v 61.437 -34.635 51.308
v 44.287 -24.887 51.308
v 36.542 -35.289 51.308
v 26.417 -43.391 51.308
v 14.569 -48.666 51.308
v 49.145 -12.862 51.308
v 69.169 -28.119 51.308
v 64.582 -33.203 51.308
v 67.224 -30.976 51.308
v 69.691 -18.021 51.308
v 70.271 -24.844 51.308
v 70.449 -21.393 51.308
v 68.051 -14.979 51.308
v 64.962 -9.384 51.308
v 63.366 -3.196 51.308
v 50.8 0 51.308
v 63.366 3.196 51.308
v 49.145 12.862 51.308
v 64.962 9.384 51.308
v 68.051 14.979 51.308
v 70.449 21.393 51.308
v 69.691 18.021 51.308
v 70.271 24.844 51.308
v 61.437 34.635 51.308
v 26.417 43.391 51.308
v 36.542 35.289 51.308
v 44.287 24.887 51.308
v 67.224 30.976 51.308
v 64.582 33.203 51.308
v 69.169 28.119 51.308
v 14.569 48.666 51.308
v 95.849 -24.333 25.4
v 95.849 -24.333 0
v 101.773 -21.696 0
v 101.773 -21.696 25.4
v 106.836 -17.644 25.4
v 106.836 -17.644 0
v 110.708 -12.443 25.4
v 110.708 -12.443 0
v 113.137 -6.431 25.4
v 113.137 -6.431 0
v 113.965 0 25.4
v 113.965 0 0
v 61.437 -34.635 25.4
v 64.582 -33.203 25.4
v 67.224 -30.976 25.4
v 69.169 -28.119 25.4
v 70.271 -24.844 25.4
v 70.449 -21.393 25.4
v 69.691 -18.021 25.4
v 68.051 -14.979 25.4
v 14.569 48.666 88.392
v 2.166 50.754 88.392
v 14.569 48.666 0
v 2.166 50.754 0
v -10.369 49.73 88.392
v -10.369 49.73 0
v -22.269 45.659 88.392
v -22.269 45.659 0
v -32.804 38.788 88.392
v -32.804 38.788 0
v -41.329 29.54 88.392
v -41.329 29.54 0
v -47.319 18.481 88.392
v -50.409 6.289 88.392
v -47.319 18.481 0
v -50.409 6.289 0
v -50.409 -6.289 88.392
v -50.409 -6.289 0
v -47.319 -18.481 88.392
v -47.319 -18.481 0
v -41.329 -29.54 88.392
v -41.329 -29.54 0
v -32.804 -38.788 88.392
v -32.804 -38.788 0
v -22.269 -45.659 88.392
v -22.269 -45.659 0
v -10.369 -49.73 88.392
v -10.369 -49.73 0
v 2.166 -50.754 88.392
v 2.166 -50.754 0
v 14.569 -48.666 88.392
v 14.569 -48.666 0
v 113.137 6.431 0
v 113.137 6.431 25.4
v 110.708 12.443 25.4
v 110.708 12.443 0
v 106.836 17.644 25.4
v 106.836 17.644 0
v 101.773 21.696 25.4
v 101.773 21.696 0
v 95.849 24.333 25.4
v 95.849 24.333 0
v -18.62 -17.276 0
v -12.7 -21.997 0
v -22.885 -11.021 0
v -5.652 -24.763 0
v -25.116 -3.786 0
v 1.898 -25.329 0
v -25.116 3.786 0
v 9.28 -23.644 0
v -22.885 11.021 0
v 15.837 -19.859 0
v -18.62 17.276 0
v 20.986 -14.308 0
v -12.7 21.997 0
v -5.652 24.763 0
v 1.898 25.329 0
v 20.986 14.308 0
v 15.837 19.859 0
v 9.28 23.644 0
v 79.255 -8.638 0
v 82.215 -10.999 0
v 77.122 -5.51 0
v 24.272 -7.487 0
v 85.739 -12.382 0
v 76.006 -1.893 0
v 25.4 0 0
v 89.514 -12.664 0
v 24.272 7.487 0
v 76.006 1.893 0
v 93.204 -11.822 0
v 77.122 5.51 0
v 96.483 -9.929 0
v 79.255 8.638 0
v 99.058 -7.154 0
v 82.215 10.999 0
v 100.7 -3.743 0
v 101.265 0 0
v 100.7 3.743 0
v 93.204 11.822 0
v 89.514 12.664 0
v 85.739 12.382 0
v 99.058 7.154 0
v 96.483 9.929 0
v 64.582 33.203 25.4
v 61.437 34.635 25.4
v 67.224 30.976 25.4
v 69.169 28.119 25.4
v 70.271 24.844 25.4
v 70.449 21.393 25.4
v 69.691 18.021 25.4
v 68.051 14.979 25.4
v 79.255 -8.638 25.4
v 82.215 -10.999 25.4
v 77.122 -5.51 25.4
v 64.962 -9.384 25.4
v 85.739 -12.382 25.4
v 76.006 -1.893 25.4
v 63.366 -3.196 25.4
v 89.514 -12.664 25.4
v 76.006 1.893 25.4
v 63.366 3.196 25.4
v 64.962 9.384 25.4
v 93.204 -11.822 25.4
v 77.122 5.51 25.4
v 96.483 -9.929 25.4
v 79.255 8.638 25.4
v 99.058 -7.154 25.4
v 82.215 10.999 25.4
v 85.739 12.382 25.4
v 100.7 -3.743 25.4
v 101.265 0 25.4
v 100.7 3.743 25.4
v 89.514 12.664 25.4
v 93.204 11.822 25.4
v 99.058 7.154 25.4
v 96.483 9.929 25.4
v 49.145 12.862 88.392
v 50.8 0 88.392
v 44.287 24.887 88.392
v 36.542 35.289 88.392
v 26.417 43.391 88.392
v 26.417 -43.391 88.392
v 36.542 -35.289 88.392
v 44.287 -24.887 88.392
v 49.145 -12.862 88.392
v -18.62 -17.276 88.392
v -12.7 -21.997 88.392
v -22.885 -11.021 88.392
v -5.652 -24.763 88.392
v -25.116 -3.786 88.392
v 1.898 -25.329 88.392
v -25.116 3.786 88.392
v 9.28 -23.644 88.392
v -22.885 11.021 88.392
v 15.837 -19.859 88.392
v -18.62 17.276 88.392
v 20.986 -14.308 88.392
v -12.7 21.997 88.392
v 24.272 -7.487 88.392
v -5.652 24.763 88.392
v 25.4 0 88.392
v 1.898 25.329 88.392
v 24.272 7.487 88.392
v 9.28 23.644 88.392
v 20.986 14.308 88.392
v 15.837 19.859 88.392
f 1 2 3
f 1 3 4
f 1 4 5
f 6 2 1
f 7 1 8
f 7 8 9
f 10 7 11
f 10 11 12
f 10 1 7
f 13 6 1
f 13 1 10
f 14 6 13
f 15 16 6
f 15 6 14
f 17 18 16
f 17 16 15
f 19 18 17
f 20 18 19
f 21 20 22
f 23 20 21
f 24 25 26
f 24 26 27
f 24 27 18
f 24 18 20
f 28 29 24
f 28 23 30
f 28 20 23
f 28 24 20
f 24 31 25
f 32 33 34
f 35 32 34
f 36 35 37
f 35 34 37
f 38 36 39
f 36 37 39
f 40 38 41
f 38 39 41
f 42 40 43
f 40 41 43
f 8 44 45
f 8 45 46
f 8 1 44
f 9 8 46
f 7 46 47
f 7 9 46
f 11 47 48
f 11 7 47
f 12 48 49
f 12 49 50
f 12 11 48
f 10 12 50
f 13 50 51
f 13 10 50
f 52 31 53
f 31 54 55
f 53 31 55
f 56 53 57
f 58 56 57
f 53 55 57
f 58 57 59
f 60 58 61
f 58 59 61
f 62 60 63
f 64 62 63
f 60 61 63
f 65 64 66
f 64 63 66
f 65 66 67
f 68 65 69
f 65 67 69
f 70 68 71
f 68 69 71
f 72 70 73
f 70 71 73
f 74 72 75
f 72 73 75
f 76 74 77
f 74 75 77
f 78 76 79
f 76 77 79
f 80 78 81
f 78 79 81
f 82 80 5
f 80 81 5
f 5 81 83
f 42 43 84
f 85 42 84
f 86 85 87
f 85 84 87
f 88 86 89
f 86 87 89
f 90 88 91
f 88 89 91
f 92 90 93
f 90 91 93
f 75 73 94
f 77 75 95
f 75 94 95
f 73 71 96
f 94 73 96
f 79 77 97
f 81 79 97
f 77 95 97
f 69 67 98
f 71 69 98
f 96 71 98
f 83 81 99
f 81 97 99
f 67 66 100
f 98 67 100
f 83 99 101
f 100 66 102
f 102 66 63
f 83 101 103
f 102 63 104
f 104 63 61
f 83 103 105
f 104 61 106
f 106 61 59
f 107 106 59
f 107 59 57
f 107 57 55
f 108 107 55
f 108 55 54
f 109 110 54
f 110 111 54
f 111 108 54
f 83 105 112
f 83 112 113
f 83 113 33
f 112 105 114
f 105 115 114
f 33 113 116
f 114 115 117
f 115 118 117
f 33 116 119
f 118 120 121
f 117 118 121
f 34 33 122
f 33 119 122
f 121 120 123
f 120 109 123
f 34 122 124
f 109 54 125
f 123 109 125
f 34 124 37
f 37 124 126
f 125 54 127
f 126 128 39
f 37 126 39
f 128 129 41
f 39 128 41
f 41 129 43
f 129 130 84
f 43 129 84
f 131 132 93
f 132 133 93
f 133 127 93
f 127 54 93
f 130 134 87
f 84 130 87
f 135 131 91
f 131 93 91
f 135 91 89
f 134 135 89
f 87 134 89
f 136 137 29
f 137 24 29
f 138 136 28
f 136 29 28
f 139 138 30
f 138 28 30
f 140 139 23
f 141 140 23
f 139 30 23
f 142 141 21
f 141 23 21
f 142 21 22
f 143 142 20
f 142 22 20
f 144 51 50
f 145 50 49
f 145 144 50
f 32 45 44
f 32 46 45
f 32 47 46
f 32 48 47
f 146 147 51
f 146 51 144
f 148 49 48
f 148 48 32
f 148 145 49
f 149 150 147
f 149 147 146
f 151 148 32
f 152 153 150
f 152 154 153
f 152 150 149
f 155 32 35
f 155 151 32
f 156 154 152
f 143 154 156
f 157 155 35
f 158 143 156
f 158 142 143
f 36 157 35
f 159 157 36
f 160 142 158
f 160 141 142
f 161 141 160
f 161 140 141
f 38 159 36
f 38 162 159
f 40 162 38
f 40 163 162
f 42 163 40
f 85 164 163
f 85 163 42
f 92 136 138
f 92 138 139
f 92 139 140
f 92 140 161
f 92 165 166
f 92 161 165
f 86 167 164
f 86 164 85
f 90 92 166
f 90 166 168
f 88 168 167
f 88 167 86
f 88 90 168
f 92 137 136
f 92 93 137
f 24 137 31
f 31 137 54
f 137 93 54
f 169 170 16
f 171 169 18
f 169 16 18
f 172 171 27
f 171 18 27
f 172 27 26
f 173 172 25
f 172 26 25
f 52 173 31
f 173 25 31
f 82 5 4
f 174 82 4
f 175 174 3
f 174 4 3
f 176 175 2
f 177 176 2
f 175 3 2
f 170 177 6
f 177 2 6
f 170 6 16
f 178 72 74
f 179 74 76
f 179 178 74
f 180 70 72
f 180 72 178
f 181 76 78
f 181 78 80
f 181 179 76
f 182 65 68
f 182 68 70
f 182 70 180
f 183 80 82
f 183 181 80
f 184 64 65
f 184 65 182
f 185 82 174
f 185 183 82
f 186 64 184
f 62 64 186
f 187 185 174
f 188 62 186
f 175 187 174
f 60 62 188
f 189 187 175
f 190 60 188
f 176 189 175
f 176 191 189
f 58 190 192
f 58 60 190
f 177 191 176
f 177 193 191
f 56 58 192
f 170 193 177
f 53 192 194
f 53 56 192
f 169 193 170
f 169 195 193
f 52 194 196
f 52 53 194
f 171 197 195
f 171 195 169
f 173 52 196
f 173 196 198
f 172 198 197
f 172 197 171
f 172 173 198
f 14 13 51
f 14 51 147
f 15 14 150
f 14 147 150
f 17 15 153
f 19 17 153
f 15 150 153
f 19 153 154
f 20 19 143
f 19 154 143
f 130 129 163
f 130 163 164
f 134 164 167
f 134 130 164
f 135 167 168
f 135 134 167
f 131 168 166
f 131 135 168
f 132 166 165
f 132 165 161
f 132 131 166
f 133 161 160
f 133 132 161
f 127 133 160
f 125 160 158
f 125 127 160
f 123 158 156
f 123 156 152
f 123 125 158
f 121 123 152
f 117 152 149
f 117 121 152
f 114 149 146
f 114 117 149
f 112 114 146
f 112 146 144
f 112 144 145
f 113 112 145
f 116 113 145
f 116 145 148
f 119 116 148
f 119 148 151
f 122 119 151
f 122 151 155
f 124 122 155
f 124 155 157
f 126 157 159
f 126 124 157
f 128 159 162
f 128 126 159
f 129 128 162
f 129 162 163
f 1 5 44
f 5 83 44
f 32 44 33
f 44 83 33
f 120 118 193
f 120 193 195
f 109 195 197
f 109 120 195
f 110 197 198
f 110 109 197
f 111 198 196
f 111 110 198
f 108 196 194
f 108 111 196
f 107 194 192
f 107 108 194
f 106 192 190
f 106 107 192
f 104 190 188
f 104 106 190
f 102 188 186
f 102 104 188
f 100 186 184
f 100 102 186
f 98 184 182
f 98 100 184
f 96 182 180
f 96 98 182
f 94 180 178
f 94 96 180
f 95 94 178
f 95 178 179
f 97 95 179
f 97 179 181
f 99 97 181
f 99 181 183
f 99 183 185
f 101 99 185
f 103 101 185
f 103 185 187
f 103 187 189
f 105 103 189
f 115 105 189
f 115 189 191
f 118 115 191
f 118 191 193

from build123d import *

# Parameters (mm, degrees)
F0_R     = 25.4
F0_R_2   = 12.7
F1_DEPTH = 25.4
F2_DEPTH = 88.392
F3_DEPTH = 51.308
F4_R     = 12.7


with BuildPart() as f1:
    # F0 (on Top) → F1 (new body)
    with BuildSketch(Plane.XY):
        with BuildLine():
            ThreePointArc((14.569248, -48.665974), (40.747747, -30.335805), (50.8, 0))
            ThreePointArc((50.8, 0), (40.747747, 30.335805), (14.569248, 48.665974))
            ThreePointArc((14.569248, 48.665974), (-50.8, 0), (14.569248, -48.665974))
        make_face()
        Circle(F0_R, mode=Mode.SUBTRACT)
        with BuildLine():
            ThreePointArc((14.569248, 48.665974), (40.747747, 30.335805), (50.8, 0))
            ThreePointArc((50.8, 0), (40.747747, -30.335805), (14.569248, -48.665974))
            Line((14.569248, -48.665974), (95.849248, -24.332987))
            ThreePointArc((95.849248, -24.332987), (63.164624, 0), (95.849248, 24.332987))
            Line((95.849248, 24.332987), (14.569248, 48.665974))
        make_face()
        with BuildLine():
            ThreePointArc((113.964624, 0), (108.938498, 15.167903), (95.849248, 24.332987))
            ThreePointArc((95.849248, 24.332987), (63.164624, 0), (95.849248, -24.332987))
            ThreePointArc((95.849248, -24.332987), (108.938498, -15.167903), (113.964624, 0))
        make_face()
        with Locations((88.564624, 0)):
            Circle(F0_R_2, mode=Mode.SUBTRACT)
    extrude(amount=F1_DEPTH)

    # F0 (on Top) → F2 (join)
    with BuildSketch(Plane.XY):
        with BuildLine():
            ThreePointArc((14.569248, -48.665974), (40.747747, -30.335805), (50.8, 0))
            ThreePointArc((50.8, 0), (40.747747, 30.335805), (14.569248, 48.665974))
            ThreePointArc((14.569248, 48.665974), (-50.8, 0), (14.569248, -48.665974))
        make_face()
        Circle(F0_R, mode=Mode.SUBTRACT)
    extrude(amount=F2_DEPTH)

    # F0 (on Top) → F3 (join)
    with BuildSketch(Plane.XY):
        with BuildLine():
            ThreePointArc((14.569248, 48.665974), (40.747747, 30.335805), (50.8, 0))
            ThreePointArc((50.8, 0), (40.747747, -30.335805), (14.569248, -48.665974))
            Line((14.569248, -48.665974), (95.849248, -24.332987))
            ThreePointArc((95.849248, -24.332987), (63.164624, 0), (95.849248, 24.332987))
            Line((95.849248, 24.332987), (14.569248, 48.665974))
        make_face()
    extrude(amount=F3_DEPTH)

    # F4
    f4_edges = [f1.edges().sort_by_distance(p)[0] for p in [
        (95.849248, -24.332987, 38.354),
        (95.849248, 24.332987, 38.354),
    ]]
    fillet(f4_edges, radius=F4_R)


solid = f1.part
